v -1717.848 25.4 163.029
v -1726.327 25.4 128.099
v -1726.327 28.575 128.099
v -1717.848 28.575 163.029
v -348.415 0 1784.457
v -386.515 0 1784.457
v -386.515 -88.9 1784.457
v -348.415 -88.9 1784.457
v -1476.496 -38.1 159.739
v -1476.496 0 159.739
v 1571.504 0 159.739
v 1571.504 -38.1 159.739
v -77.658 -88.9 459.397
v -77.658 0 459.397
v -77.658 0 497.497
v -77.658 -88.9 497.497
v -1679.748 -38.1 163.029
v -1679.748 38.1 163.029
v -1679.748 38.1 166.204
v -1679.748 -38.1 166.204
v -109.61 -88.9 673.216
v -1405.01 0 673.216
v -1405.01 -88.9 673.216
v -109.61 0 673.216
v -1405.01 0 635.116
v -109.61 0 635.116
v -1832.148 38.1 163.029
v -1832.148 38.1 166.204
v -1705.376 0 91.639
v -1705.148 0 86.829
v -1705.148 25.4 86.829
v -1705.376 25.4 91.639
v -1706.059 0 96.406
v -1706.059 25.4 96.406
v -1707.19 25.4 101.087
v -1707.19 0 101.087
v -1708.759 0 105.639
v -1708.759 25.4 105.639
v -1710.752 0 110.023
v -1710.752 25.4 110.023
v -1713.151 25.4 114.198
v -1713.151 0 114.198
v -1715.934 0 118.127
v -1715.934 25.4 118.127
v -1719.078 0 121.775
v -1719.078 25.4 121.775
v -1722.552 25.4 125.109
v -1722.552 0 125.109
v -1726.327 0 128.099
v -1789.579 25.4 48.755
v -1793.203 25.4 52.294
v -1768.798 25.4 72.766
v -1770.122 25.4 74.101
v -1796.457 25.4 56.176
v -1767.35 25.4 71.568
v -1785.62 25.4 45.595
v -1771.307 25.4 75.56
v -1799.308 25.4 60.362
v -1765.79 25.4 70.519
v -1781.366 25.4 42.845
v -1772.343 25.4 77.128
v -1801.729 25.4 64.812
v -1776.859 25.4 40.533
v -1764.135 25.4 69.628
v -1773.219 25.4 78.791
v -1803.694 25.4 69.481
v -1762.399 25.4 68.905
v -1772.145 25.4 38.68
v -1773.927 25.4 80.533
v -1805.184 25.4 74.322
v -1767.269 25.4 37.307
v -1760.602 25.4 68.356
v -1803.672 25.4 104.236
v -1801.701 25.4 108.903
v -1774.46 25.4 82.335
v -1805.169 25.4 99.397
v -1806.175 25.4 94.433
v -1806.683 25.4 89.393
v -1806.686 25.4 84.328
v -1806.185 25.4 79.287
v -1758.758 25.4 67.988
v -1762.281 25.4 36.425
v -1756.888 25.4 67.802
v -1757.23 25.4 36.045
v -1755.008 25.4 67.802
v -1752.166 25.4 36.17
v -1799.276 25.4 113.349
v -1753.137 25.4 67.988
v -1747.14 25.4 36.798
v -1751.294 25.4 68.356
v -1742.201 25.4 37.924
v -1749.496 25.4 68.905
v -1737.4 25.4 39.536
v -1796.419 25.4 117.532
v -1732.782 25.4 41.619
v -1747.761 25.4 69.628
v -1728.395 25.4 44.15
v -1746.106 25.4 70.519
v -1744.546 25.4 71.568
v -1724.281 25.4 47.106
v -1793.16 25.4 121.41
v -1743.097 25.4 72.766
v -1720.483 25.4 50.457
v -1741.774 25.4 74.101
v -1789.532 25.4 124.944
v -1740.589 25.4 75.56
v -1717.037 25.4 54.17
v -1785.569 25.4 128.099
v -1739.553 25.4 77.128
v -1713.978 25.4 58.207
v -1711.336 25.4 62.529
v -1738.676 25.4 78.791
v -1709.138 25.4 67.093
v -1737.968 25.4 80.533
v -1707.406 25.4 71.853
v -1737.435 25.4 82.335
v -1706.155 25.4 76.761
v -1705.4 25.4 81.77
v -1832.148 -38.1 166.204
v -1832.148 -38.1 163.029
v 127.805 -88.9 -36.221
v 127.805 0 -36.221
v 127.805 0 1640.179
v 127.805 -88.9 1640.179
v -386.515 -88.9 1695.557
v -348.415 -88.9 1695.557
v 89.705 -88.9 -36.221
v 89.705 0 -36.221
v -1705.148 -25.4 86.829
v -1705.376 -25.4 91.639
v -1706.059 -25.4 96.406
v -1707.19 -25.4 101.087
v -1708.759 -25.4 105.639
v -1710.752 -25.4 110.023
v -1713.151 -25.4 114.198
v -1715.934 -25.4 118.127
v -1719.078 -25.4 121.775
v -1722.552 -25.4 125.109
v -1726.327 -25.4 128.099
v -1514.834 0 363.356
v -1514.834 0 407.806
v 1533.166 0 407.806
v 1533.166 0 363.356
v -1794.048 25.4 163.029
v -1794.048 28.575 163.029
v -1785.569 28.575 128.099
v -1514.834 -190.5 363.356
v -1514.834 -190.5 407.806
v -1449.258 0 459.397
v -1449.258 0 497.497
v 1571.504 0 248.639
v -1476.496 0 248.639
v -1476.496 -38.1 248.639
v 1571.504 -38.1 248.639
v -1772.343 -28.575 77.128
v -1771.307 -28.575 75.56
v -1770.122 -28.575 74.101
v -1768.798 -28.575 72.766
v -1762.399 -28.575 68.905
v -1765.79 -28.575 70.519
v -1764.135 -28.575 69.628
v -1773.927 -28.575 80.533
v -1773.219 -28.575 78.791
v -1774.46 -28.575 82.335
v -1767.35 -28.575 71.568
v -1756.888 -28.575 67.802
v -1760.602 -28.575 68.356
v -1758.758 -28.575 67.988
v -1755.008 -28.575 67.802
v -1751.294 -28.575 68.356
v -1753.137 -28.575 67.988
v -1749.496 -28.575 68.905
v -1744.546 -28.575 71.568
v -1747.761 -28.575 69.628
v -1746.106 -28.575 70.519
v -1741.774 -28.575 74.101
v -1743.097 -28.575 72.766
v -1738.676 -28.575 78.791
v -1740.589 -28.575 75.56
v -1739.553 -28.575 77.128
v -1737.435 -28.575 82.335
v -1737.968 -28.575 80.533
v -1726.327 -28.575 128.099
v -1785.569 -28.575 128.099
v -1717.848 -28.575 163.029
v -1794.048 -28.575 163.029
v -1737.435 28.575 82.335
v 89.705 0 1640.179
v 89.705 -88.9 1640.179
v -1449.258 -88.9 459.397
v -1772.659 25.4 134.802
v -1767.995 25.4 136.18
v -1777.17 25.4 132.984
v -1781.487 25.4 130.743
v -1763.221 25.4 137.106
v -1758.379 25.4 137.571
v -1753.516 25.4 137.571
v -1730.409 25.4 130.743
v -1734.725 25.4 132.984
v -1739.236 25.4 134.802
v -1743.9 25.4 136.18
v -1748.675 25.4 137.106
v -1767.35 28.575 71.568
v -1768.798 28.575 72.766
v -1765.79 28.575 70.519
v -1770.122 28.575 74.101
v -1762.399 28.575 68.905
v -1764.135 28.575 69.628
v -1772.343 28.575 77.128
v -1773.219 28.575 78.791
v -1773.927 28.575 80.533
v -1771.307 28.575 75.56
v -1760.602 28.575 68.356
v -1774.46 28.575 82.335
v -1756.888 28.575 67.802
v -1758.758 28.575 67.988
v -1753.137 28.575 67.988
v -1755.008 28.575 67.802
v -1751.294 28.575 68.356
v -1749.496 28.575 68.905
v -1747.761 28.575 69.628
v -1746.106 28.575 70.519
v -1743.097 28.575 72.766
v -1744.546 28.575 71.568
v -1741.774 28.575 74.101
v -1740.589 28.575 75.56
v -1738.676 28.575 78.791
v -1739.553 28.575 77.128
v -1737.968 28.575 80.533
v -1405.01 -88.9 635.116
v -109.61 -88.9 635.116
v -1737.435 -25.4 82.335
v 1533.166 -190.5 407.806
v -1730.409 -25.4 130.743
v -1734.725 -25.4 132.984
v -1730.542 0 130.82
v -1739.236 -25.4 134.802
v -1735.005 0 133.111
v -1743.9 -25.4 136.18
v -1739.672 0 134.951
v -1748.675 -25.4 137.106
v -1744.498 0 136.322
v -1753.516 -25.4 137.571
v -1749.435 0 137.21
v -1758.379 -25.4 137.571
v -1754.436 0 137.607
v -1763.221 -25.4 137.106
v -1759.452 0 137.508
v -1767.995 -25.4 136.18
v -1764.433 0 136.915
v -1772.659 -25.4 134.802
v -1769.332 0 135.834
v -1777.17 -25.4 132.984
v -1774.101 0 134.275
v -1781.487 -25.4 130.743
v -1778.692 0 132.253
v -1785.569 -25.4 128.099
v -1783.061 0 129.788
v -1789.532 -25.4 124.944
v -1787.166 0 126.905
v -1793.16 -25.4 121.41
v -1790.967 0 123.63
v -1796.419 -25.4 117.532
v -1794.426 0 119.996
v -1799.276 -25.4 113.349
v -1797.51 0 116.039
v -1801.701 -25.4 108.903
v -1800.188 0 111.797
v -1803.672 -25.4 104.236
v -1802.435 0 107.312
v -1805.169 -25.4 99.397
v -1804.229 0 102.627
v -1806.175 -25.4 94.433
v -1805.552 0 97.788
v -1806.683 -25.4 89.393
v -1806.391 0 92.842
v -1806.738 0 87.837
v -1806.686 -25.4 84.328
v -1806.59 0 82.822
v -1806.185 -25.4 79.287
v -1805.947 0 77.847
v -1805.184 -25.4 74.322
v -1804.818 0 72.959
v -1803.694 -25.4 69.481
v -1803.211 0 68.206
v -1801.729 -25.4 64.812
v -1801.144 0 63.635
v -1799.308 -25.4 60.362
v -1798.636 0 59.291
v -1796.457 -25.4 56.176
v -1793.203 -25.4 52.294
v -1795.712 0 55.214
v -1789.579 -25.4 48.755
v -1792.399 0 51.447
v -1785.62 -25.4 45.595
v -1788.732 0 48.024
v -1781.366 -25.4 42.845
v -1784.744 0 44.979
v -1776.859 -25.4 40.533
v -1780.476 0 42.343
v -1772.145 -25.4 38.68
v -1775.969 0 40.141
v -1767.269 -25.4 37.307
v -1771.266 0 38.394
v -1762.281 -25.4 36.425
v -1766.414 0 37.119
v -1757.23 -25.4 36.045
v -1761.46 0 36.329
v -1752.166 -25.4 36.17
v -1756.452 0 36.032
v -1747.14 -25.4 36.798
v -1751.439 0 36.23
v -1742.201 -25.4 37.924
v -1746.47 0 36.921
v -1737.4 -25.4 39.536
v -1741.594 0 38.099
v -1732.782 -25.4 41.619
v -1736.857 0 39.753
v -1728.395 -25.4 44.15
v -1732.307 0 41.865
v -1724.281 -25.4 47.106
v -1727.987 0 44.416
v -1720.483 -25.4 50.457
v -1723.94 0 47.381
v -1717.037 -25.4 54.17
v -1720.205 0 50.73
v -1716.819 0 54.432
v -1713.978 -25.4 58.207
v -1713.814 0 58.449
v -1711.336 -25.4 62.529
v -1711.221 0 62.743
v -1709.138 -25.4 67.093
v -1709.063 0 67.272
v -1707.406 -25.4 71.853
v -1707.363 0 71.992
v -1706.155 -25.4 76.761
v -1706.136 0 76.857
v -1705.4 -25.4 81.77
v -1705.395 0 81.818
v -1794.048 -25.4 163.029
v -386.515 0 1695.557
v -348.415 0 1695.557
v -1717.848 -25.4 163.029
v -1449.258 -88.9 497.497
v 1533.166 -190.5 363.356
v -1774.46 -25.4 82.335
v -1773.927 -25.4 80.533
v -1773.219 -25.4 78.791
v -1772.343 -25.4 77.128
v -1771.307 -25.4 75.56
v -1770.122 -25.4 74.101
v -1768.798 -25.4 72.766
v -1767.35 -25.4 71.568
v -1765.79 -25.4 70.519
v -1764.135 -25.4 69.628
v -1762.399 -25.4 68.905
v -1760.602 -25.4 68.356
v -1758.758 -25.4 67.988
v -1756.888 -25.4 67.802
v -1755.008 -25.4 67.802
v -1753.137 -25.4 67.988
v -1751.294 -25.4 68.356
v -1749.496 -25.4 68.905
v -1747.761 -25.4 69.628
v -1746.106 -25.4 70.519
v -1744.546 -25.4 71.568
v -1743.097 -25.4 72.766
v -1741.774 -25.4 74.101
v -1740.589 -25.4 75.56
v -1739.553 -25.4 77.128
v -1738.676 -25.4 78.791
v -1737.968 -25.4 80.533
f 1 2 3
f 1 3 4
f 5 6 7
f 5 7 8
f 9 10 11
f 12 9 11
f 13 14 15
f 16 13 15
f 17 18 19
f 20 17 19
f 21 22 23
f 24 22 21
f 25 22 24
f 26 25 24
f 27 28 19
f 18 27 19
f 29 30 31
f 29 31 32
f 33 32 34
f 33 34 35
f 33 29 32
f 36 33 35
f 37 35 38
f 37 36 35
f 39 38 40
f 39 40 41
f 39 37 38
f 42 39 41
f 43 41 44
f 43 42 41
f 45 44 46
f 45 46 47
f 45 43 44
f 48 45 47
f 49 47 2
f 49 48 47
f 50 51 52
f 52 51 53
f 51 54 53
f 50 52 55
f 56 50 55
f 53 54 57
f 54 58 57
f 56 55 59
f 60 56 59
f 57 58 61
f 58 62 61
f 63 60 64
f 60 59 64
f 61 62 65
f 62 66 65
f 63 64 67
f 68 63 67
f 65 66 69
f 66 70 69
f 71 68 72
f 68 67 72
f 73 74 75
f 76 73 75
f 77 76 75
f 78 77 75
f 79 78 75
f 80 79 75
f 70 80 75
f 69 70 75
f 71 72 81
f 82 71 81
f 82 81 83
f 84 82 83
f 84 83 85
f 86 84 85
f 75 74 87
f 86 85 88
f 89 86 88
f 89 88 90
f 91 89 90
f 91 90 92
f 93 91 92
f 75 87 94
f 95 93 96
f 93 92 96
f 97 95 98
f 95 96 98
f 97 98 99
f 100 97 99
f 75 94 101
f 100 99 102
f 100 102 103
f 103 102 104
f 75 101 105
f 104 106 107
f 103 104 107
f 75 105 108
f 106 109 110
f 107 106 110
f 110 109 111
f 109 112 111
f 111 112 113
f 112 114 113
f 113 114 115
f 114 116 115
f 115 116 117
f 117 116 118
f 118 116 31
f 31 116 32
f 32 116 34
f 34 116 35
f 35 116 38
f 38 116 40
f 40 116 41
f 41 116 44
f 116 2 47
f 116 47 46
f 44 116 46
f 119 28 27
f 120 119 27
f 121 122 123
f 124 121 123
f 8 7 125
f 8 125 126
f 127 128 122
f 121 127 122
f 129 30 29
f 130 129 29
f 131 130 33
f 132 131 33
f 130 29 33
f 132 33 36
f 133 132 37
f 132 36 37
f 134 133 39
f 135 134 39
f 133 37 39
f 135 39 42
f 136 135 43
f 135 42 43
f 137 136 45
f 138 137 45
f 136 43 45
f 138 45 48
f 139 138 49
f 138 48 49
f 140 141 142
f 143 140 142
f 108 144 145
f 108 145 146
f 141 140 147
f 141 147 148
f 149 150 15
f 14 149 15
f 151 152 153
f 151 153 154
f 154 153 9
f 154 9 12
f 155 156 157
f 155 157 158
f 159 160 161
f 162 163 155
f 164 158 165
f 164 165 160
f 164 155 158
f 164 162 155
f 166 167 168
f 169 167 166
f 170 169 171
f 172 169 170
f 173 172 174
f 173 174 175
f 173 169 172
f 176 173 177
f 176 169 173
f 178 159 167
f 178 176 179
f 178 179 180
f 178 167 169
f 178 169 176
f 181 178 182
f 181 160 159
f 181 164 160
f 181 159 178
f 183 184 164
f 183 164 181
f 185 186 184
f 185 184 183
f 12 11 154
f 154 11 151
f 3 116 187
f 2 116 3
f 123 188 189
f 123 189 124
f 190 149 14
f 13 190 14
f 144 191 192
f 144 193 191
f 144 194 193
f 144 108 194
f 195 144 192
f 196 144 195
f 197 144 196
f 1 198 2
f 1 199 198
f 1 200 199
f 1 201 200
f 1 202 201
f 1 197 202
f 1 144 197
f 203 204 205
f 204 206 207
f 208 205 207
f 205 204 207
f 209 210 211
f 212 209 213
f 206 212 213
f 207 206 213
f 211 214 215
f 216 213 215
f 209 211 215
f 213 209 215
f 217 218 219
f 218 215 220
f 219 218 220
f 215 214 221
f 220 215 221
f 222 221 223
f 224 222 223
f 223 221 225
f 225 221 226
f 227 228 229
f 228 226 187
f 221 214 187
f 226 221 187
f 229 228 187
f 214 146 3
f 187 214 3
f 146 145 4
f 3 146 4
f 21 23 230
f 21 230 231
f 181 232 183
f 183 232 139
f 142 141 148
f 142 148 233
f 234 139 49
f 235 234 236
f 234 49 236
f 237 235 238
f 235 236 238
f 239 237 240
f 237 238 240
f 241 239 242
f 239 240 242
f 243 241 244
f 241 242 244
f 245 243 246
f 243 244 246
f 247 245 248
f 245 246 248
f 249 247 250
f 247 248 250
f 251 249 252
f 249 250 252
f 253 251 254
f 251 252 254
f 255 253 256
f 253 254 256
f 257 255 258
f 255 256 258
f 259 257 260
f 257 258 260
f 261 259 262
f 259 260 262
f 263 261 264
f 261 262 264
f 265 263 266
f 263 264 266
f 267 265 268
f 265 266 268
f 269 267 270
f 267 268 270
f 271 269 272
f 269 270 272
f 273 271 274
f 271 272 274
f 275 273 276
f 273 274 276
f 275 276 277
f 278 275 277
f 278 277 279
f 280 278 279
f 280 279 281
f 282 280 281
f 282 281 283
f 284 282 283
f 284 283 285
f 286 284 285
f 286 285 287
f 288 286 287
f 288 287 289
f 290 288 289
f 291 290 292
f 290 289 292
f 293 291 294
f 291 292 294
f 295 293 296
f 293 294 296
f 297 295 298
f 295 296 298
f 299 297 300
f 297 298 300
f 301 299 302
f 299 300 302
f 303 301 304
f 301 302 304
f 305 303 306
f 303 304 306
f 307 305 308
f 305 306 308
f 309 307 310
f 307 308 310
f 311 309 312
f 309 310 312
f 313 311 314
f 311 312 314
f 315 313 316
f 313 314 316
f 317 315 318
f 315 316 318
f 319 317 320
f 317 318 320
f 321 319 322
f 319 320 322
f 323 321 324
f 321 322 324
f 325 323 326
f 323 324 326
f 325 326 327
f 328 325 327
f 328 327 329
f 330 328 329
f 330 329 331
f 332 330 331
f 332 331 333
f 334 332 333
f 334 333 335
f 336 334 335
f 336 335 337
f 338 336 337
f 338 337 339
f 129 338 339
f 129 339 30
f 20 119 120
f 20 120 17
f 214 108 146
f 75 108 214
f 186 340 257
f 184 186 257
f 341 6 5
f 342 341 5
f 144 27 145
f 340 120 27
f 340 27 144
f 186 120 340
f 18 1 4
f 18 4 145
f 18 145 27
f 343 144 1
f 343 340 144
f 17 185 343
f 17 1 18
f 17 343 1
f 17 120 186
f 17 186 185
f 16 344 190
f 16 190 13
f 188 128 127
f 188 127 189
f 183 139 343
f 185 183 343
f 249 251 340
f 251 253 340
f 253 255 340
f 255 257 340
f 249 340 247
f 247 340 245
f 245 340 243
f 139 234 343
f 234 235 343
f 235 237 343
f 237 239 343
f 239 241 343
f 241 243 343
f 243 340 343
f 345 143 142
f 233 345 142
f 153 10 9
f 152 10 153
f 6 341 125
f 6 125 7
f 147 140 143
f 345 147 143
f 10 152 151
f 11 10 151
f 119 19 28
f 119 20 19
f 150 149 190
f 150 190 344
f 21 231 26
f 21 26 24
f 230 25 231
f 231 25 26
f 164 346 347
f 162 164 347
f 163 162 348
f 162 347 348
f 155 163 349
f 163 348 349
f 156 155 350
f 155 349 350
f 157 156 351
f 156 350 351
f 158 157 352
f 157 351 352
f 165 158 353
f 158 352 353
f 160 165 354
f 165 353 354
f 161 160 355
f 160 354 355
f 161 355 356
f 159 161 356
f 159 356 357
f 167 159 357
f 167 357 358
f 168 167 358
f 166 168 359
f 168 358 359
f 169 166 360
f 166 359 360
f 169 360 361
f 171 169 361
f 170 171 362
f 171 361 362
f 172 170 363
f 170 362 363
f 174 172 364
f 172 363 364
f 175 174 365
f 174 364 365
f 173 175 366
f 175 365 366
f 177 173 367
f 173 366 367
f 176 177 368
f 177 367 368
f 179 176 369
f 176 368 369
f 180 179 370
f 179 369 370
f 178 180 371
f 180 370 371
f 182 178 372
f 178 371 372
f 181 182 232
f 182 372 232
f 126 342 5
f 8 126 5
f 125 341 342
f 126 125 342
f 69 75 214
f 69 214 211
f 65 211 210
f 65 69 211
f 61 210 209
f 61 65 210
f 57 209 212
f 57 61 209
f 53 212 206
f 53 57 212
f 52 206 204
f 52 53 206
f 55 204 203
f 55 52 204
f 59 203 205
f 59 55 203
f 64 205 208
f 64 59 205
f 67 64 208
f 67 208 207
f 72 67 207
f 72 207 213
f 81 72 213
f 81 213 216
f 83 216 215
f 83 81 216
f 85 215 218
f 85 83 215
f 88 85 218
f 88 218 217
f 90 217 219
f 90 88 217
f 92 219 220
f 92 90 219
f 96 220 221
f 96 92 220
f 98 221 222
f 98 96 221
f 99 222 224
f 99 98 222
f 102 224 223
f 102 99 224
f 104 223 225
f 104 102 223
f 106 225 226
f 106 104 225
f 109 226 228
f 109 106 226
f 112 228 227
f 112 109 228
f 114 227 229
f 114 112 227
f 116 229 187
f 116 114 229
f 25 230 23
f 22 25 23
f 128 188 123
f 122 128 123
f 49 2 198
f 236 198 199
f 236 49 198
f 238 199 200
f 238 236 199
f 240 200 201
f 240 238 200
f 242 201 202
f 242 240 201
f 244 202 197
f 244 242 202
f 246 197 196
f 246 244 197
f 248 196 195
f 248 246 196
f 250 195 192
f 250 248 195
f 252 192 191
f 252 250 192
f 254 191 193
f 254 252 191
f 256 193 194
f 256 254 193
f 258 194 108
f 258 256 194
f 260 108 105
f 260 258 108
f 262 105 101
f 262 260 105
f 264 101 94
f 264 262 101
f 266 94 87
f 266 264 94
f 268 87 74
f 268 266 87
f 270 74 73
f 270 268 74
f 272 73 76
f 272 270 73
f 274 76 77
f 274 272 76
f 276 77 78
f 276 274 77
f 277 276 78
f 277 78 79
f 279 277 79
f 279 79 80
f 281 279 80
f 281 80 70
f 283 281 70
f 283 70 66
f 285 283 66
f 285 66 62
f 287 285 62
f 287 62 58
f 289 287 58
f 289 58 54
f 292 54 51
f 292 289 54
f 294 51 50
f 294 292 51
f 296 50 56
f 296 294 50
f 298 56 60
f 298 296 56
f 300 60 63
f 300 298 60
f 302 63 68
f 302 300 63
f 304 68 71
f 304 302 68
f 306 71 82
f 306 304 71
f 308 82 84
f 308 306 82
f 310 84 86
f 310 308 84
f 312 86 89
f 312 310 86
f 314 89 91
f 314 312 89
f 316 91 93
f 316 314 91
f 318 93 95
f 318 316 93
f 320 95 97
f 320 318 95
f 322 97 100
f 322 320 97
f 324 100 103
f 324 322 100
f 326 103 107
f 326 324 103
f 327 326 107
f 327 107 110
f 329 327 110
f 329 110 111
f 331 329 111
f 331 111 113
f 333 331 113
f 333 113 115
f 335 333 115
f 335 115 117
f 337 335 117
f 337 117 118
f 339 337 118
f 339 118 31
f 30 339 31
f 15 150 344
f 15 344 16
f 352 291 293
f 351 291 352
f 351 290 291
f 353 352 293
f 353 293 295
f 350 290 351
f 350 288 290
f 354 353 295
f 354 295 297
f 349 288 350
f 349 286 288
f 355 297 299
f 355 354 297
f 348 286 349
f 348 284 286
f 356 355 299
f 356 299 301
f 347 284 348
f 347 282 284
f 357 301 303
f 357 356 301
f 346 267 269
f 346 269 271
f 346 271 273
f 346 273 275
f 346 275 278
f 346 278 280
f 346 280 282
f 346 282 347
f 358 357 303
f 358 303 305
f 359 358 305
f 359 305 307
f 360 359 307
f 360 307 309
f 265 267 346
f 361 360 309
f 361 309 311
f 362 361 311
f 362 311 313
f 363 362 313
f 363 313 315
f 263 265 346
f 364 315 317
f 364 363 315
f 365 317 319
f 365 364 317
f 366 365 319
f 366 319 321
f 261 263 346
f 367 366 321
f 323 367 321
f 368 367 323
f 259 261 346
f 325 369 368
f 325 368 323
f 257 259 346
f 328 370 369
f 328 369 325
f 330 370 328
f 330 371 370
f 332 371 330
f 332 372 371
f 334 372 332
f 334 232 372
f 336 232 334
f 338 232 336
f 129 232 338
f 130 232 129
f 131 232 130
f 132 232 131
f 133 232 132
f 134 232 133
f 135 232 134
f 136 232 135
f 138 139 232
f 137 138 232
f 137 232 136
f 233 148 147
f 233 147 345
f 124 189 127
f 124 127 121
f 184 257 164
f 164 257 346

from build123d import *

# Parameters (mm, degrees)
F0_W      = 38.1
F0_H      = 1676.4
F1_DEPTH  = 88.9
F2_W      = 38.1
F2_H      = 88.9
F3_DEPTH  = 88.9
F4_W      = 1371.6
F4_H      = 38.1
F5_DEPTH  = 88.9
F7_DEPTH  = 38.1
F8_START  = -25.4
F8_DEPTH  = 3.175
F9_START  = 25.4
F9_DEPTH  = 3.175
F10_DEPTH = 25.4
F11_W     = 1295.4
F11_H     = 38.1
F12_DEPTH = 88.9
F13_W     = 3048
F13_H     = 44.45
F14_DEPTH = 190.5
F15_W     = 3048
F15_H     = 88.9
F16_DEPTH = 38.1


with BuildPart() as f1:
    # F0 (on Front) → F1 (new body)
    with BuildSketch(Plane.XZ):
        with Locations((108.7546263142, 801.9786462794)):
            Rectangle(F0_W, F0_H)
    extrude(amount=F1_DEPTH)


with BuildPart() as f3:
    # F2 (on Front) → F3 (new body)
    with BuildSketch(Plane.XZ):
        with Locations((-367.4653470516, 1740.0070304467)):
            Rectangle(F2_W, F2_H)
    extrude(amount=F3_DEPTH)


with BuildPart() as f5:
    # F4 (on Front) → F5 (new body)
    with BuildSketch(Plane.XZ):
        with Locations((-763.4580210589, 478.4468412399)):
            Rectangle(F4_W, F4_H)
    extrude(amount=F5_DEPTH)


with BuildPart() as f7:
    # F6 (on Front) → F7 (new body, symmetric)
    with BuildSketch(Plane.XZ):
        Polygon((-1679.7477558136, 166.2040746689), (-1832.1477558136, 166.2040746689), (-1832.1477558136, 163.0290746689), (-1794.0477558136, 163.0290746689), (-1717.8477558136, 163.0290746689), (-1679.7477558136, 163.0290746689), align=None)
    extrude(amount=F7_DEPTH, both=True)

    # F6 (on Front) → F8 (join)
    with BuildSketch(Plane.XZ.offset(F8_START)):
        with BuildLine():
            ThreePointArc((-1726.3266209758, 128.0992621039), (-1755.9477558136, 137.6290746689), (-1785.5688906514, 128.0992621039))
            Line((-1785.5688906514, 128.0992621039), (-1774.4601607885, 82.3353721814))
            ThreePointArc((-1774.4601607885, 82.3353721814), (-1755.9477558136, 67.7790746689), (-1737.4353508387, 82.3353721814))
            Line((-1737.4353508387, 82.3353721814), (-1726.3266209758, 128.0992621039))
        make_face()
        with BuildLine():
            Line((-1717.8477558136, 163.0290746689), (-1794.0477558136, 163.0290746689))
            Line((-1794.0477558136, 163.0290746689), (-1785.5688906514, 128.0992621039))
            ThreePointArc((-1785.5688906514, 128.0992621039), (-1755.9477558136, 137.6290746689), (-1726.3266209758, 128.0992621039))
            Line((-1726.3266209758, 128.0992621039), (-1717.8477558136, 163.0290746689))
        make_face()
    extrude(amount=-F8_DEPTH)

    # F6 (on Front) → F9 (join)
    with BuildSketch(Plane.XZ.offset(F9_START)):
        with BuildLine():
            Line((-1717.8477558136, 163.0290746689), (-1794.0477558136, 163.0290746689))
            Line((-1794.0477558136, 163.0290746689), (-1785.5688906514, 128.0992621039))
            ThreePointArc((-1785.5688906514, 128.0992621039), (-1755.9477558136, 137.6290746689), (-1726.3266209758, 128.0992621039))
            Line((-1726.3266209758, 128.0992621039), (-1717.8477558136, 163.0290746689))
        make_face()
        with BuildLine():
            ThreePointArc((-1726.3266209758, 128.0992621039), (-1755.9477558136, 137.6290746689), (-1785.5688906514, 128.0992621039))
            Line((-1785.5688906514, 128.0992621039), (-1774.4601607885, 82.3353721814))
            ThreePointArc((-1774.4601607885, 82.3353721814), (-1755.9477558136, 67.7790746689), (-1737.4353508387, 82.3353721814))
            Line((-1737.4353508387, 82.3353721814), (-1726.3266209758, 128.0992621039))
        make_face()
    extrude(amount=F9_DEPTH)

    # F6 (on Front) → F10 (join, symmetric)
    with BuildSketch(Plane.XZ):
        with BuildLine():
            ThreePointArc((-1726.3266209758, 128.0992621039), (-1755.9477558136, 137.6290746689), (-1785.5688906514, 128.0992621039))
            Line((-1785.5688906514, 128.0992621039), (-1774.4601607885, 82.3353721814))
            ThreePointArc((-1774.4601607885, 82.3353721814), (-1755.9477558136, 67.7790746689), (-1737.4353508387, 82.3353721814))
            Line((-1737.4353508387, 82.3353721814), (-1726.3266209758, 128.0992621039))
        make_face()
        with BuildLine():
            Line((-1774.4601607885, 82.3353721814), (-1785.5688906514, 128.0992621039))
            ThreePointArc((-1785.5688906514, 128.0992621039), (-1779.1413578434, 41.6328710133), (-1705.1477558136, 86.8290746689))
            ThreePointArc((-1705.1477558136, 86.8290746689), (-1710.751552158, 110.0226766987), (-1726.3266209758, 128.0992621039))
            Line((-1726.3266209758, 128.0992621039), (-1737.4353508387, 82.3353721814))
            ThreePointArc((-1737.4353508387, 82.3353721814), (-1755.9477558136, 67.7790746689), (-1774.4601607885, 82.3353721814))
        make_face()
    extrude(amount=F10_DEPTH, both=True)


with BuildPart() as f12:
    # F11 (on Front) → F12 (new body)
    with BuildSketch(Plane.XZ):
        with Locations((-757.3101041794, 654.1661599159)):
            Rectangle(F11_W, F11_H)
    extrude(amount=F12_DEPTH)


with BuildPart() as f14:
    # F13 (on Front) → F14 (new body)
    with BuildSketch(Plane.XZ):
        with Locations((9.1657526059, 385.5807185173)):
            Rectangle(F13_W, F13_H)
    extrude(amount=F14_DEPTH)


with BuildPart() as f16:
    # F15 (on Front) → F16 (new body)
    with BuildSketch(Plane.XZ):
        with Locations((47.5043764114, 204.1886449575)):
            Rectangle(F15_W, F15_H)
    extrude(amount=F16_DEPTH)


solid = Compound([f1.part, f3.part, f5.part, f7.part, f12.part, f14.part, f16.part])
